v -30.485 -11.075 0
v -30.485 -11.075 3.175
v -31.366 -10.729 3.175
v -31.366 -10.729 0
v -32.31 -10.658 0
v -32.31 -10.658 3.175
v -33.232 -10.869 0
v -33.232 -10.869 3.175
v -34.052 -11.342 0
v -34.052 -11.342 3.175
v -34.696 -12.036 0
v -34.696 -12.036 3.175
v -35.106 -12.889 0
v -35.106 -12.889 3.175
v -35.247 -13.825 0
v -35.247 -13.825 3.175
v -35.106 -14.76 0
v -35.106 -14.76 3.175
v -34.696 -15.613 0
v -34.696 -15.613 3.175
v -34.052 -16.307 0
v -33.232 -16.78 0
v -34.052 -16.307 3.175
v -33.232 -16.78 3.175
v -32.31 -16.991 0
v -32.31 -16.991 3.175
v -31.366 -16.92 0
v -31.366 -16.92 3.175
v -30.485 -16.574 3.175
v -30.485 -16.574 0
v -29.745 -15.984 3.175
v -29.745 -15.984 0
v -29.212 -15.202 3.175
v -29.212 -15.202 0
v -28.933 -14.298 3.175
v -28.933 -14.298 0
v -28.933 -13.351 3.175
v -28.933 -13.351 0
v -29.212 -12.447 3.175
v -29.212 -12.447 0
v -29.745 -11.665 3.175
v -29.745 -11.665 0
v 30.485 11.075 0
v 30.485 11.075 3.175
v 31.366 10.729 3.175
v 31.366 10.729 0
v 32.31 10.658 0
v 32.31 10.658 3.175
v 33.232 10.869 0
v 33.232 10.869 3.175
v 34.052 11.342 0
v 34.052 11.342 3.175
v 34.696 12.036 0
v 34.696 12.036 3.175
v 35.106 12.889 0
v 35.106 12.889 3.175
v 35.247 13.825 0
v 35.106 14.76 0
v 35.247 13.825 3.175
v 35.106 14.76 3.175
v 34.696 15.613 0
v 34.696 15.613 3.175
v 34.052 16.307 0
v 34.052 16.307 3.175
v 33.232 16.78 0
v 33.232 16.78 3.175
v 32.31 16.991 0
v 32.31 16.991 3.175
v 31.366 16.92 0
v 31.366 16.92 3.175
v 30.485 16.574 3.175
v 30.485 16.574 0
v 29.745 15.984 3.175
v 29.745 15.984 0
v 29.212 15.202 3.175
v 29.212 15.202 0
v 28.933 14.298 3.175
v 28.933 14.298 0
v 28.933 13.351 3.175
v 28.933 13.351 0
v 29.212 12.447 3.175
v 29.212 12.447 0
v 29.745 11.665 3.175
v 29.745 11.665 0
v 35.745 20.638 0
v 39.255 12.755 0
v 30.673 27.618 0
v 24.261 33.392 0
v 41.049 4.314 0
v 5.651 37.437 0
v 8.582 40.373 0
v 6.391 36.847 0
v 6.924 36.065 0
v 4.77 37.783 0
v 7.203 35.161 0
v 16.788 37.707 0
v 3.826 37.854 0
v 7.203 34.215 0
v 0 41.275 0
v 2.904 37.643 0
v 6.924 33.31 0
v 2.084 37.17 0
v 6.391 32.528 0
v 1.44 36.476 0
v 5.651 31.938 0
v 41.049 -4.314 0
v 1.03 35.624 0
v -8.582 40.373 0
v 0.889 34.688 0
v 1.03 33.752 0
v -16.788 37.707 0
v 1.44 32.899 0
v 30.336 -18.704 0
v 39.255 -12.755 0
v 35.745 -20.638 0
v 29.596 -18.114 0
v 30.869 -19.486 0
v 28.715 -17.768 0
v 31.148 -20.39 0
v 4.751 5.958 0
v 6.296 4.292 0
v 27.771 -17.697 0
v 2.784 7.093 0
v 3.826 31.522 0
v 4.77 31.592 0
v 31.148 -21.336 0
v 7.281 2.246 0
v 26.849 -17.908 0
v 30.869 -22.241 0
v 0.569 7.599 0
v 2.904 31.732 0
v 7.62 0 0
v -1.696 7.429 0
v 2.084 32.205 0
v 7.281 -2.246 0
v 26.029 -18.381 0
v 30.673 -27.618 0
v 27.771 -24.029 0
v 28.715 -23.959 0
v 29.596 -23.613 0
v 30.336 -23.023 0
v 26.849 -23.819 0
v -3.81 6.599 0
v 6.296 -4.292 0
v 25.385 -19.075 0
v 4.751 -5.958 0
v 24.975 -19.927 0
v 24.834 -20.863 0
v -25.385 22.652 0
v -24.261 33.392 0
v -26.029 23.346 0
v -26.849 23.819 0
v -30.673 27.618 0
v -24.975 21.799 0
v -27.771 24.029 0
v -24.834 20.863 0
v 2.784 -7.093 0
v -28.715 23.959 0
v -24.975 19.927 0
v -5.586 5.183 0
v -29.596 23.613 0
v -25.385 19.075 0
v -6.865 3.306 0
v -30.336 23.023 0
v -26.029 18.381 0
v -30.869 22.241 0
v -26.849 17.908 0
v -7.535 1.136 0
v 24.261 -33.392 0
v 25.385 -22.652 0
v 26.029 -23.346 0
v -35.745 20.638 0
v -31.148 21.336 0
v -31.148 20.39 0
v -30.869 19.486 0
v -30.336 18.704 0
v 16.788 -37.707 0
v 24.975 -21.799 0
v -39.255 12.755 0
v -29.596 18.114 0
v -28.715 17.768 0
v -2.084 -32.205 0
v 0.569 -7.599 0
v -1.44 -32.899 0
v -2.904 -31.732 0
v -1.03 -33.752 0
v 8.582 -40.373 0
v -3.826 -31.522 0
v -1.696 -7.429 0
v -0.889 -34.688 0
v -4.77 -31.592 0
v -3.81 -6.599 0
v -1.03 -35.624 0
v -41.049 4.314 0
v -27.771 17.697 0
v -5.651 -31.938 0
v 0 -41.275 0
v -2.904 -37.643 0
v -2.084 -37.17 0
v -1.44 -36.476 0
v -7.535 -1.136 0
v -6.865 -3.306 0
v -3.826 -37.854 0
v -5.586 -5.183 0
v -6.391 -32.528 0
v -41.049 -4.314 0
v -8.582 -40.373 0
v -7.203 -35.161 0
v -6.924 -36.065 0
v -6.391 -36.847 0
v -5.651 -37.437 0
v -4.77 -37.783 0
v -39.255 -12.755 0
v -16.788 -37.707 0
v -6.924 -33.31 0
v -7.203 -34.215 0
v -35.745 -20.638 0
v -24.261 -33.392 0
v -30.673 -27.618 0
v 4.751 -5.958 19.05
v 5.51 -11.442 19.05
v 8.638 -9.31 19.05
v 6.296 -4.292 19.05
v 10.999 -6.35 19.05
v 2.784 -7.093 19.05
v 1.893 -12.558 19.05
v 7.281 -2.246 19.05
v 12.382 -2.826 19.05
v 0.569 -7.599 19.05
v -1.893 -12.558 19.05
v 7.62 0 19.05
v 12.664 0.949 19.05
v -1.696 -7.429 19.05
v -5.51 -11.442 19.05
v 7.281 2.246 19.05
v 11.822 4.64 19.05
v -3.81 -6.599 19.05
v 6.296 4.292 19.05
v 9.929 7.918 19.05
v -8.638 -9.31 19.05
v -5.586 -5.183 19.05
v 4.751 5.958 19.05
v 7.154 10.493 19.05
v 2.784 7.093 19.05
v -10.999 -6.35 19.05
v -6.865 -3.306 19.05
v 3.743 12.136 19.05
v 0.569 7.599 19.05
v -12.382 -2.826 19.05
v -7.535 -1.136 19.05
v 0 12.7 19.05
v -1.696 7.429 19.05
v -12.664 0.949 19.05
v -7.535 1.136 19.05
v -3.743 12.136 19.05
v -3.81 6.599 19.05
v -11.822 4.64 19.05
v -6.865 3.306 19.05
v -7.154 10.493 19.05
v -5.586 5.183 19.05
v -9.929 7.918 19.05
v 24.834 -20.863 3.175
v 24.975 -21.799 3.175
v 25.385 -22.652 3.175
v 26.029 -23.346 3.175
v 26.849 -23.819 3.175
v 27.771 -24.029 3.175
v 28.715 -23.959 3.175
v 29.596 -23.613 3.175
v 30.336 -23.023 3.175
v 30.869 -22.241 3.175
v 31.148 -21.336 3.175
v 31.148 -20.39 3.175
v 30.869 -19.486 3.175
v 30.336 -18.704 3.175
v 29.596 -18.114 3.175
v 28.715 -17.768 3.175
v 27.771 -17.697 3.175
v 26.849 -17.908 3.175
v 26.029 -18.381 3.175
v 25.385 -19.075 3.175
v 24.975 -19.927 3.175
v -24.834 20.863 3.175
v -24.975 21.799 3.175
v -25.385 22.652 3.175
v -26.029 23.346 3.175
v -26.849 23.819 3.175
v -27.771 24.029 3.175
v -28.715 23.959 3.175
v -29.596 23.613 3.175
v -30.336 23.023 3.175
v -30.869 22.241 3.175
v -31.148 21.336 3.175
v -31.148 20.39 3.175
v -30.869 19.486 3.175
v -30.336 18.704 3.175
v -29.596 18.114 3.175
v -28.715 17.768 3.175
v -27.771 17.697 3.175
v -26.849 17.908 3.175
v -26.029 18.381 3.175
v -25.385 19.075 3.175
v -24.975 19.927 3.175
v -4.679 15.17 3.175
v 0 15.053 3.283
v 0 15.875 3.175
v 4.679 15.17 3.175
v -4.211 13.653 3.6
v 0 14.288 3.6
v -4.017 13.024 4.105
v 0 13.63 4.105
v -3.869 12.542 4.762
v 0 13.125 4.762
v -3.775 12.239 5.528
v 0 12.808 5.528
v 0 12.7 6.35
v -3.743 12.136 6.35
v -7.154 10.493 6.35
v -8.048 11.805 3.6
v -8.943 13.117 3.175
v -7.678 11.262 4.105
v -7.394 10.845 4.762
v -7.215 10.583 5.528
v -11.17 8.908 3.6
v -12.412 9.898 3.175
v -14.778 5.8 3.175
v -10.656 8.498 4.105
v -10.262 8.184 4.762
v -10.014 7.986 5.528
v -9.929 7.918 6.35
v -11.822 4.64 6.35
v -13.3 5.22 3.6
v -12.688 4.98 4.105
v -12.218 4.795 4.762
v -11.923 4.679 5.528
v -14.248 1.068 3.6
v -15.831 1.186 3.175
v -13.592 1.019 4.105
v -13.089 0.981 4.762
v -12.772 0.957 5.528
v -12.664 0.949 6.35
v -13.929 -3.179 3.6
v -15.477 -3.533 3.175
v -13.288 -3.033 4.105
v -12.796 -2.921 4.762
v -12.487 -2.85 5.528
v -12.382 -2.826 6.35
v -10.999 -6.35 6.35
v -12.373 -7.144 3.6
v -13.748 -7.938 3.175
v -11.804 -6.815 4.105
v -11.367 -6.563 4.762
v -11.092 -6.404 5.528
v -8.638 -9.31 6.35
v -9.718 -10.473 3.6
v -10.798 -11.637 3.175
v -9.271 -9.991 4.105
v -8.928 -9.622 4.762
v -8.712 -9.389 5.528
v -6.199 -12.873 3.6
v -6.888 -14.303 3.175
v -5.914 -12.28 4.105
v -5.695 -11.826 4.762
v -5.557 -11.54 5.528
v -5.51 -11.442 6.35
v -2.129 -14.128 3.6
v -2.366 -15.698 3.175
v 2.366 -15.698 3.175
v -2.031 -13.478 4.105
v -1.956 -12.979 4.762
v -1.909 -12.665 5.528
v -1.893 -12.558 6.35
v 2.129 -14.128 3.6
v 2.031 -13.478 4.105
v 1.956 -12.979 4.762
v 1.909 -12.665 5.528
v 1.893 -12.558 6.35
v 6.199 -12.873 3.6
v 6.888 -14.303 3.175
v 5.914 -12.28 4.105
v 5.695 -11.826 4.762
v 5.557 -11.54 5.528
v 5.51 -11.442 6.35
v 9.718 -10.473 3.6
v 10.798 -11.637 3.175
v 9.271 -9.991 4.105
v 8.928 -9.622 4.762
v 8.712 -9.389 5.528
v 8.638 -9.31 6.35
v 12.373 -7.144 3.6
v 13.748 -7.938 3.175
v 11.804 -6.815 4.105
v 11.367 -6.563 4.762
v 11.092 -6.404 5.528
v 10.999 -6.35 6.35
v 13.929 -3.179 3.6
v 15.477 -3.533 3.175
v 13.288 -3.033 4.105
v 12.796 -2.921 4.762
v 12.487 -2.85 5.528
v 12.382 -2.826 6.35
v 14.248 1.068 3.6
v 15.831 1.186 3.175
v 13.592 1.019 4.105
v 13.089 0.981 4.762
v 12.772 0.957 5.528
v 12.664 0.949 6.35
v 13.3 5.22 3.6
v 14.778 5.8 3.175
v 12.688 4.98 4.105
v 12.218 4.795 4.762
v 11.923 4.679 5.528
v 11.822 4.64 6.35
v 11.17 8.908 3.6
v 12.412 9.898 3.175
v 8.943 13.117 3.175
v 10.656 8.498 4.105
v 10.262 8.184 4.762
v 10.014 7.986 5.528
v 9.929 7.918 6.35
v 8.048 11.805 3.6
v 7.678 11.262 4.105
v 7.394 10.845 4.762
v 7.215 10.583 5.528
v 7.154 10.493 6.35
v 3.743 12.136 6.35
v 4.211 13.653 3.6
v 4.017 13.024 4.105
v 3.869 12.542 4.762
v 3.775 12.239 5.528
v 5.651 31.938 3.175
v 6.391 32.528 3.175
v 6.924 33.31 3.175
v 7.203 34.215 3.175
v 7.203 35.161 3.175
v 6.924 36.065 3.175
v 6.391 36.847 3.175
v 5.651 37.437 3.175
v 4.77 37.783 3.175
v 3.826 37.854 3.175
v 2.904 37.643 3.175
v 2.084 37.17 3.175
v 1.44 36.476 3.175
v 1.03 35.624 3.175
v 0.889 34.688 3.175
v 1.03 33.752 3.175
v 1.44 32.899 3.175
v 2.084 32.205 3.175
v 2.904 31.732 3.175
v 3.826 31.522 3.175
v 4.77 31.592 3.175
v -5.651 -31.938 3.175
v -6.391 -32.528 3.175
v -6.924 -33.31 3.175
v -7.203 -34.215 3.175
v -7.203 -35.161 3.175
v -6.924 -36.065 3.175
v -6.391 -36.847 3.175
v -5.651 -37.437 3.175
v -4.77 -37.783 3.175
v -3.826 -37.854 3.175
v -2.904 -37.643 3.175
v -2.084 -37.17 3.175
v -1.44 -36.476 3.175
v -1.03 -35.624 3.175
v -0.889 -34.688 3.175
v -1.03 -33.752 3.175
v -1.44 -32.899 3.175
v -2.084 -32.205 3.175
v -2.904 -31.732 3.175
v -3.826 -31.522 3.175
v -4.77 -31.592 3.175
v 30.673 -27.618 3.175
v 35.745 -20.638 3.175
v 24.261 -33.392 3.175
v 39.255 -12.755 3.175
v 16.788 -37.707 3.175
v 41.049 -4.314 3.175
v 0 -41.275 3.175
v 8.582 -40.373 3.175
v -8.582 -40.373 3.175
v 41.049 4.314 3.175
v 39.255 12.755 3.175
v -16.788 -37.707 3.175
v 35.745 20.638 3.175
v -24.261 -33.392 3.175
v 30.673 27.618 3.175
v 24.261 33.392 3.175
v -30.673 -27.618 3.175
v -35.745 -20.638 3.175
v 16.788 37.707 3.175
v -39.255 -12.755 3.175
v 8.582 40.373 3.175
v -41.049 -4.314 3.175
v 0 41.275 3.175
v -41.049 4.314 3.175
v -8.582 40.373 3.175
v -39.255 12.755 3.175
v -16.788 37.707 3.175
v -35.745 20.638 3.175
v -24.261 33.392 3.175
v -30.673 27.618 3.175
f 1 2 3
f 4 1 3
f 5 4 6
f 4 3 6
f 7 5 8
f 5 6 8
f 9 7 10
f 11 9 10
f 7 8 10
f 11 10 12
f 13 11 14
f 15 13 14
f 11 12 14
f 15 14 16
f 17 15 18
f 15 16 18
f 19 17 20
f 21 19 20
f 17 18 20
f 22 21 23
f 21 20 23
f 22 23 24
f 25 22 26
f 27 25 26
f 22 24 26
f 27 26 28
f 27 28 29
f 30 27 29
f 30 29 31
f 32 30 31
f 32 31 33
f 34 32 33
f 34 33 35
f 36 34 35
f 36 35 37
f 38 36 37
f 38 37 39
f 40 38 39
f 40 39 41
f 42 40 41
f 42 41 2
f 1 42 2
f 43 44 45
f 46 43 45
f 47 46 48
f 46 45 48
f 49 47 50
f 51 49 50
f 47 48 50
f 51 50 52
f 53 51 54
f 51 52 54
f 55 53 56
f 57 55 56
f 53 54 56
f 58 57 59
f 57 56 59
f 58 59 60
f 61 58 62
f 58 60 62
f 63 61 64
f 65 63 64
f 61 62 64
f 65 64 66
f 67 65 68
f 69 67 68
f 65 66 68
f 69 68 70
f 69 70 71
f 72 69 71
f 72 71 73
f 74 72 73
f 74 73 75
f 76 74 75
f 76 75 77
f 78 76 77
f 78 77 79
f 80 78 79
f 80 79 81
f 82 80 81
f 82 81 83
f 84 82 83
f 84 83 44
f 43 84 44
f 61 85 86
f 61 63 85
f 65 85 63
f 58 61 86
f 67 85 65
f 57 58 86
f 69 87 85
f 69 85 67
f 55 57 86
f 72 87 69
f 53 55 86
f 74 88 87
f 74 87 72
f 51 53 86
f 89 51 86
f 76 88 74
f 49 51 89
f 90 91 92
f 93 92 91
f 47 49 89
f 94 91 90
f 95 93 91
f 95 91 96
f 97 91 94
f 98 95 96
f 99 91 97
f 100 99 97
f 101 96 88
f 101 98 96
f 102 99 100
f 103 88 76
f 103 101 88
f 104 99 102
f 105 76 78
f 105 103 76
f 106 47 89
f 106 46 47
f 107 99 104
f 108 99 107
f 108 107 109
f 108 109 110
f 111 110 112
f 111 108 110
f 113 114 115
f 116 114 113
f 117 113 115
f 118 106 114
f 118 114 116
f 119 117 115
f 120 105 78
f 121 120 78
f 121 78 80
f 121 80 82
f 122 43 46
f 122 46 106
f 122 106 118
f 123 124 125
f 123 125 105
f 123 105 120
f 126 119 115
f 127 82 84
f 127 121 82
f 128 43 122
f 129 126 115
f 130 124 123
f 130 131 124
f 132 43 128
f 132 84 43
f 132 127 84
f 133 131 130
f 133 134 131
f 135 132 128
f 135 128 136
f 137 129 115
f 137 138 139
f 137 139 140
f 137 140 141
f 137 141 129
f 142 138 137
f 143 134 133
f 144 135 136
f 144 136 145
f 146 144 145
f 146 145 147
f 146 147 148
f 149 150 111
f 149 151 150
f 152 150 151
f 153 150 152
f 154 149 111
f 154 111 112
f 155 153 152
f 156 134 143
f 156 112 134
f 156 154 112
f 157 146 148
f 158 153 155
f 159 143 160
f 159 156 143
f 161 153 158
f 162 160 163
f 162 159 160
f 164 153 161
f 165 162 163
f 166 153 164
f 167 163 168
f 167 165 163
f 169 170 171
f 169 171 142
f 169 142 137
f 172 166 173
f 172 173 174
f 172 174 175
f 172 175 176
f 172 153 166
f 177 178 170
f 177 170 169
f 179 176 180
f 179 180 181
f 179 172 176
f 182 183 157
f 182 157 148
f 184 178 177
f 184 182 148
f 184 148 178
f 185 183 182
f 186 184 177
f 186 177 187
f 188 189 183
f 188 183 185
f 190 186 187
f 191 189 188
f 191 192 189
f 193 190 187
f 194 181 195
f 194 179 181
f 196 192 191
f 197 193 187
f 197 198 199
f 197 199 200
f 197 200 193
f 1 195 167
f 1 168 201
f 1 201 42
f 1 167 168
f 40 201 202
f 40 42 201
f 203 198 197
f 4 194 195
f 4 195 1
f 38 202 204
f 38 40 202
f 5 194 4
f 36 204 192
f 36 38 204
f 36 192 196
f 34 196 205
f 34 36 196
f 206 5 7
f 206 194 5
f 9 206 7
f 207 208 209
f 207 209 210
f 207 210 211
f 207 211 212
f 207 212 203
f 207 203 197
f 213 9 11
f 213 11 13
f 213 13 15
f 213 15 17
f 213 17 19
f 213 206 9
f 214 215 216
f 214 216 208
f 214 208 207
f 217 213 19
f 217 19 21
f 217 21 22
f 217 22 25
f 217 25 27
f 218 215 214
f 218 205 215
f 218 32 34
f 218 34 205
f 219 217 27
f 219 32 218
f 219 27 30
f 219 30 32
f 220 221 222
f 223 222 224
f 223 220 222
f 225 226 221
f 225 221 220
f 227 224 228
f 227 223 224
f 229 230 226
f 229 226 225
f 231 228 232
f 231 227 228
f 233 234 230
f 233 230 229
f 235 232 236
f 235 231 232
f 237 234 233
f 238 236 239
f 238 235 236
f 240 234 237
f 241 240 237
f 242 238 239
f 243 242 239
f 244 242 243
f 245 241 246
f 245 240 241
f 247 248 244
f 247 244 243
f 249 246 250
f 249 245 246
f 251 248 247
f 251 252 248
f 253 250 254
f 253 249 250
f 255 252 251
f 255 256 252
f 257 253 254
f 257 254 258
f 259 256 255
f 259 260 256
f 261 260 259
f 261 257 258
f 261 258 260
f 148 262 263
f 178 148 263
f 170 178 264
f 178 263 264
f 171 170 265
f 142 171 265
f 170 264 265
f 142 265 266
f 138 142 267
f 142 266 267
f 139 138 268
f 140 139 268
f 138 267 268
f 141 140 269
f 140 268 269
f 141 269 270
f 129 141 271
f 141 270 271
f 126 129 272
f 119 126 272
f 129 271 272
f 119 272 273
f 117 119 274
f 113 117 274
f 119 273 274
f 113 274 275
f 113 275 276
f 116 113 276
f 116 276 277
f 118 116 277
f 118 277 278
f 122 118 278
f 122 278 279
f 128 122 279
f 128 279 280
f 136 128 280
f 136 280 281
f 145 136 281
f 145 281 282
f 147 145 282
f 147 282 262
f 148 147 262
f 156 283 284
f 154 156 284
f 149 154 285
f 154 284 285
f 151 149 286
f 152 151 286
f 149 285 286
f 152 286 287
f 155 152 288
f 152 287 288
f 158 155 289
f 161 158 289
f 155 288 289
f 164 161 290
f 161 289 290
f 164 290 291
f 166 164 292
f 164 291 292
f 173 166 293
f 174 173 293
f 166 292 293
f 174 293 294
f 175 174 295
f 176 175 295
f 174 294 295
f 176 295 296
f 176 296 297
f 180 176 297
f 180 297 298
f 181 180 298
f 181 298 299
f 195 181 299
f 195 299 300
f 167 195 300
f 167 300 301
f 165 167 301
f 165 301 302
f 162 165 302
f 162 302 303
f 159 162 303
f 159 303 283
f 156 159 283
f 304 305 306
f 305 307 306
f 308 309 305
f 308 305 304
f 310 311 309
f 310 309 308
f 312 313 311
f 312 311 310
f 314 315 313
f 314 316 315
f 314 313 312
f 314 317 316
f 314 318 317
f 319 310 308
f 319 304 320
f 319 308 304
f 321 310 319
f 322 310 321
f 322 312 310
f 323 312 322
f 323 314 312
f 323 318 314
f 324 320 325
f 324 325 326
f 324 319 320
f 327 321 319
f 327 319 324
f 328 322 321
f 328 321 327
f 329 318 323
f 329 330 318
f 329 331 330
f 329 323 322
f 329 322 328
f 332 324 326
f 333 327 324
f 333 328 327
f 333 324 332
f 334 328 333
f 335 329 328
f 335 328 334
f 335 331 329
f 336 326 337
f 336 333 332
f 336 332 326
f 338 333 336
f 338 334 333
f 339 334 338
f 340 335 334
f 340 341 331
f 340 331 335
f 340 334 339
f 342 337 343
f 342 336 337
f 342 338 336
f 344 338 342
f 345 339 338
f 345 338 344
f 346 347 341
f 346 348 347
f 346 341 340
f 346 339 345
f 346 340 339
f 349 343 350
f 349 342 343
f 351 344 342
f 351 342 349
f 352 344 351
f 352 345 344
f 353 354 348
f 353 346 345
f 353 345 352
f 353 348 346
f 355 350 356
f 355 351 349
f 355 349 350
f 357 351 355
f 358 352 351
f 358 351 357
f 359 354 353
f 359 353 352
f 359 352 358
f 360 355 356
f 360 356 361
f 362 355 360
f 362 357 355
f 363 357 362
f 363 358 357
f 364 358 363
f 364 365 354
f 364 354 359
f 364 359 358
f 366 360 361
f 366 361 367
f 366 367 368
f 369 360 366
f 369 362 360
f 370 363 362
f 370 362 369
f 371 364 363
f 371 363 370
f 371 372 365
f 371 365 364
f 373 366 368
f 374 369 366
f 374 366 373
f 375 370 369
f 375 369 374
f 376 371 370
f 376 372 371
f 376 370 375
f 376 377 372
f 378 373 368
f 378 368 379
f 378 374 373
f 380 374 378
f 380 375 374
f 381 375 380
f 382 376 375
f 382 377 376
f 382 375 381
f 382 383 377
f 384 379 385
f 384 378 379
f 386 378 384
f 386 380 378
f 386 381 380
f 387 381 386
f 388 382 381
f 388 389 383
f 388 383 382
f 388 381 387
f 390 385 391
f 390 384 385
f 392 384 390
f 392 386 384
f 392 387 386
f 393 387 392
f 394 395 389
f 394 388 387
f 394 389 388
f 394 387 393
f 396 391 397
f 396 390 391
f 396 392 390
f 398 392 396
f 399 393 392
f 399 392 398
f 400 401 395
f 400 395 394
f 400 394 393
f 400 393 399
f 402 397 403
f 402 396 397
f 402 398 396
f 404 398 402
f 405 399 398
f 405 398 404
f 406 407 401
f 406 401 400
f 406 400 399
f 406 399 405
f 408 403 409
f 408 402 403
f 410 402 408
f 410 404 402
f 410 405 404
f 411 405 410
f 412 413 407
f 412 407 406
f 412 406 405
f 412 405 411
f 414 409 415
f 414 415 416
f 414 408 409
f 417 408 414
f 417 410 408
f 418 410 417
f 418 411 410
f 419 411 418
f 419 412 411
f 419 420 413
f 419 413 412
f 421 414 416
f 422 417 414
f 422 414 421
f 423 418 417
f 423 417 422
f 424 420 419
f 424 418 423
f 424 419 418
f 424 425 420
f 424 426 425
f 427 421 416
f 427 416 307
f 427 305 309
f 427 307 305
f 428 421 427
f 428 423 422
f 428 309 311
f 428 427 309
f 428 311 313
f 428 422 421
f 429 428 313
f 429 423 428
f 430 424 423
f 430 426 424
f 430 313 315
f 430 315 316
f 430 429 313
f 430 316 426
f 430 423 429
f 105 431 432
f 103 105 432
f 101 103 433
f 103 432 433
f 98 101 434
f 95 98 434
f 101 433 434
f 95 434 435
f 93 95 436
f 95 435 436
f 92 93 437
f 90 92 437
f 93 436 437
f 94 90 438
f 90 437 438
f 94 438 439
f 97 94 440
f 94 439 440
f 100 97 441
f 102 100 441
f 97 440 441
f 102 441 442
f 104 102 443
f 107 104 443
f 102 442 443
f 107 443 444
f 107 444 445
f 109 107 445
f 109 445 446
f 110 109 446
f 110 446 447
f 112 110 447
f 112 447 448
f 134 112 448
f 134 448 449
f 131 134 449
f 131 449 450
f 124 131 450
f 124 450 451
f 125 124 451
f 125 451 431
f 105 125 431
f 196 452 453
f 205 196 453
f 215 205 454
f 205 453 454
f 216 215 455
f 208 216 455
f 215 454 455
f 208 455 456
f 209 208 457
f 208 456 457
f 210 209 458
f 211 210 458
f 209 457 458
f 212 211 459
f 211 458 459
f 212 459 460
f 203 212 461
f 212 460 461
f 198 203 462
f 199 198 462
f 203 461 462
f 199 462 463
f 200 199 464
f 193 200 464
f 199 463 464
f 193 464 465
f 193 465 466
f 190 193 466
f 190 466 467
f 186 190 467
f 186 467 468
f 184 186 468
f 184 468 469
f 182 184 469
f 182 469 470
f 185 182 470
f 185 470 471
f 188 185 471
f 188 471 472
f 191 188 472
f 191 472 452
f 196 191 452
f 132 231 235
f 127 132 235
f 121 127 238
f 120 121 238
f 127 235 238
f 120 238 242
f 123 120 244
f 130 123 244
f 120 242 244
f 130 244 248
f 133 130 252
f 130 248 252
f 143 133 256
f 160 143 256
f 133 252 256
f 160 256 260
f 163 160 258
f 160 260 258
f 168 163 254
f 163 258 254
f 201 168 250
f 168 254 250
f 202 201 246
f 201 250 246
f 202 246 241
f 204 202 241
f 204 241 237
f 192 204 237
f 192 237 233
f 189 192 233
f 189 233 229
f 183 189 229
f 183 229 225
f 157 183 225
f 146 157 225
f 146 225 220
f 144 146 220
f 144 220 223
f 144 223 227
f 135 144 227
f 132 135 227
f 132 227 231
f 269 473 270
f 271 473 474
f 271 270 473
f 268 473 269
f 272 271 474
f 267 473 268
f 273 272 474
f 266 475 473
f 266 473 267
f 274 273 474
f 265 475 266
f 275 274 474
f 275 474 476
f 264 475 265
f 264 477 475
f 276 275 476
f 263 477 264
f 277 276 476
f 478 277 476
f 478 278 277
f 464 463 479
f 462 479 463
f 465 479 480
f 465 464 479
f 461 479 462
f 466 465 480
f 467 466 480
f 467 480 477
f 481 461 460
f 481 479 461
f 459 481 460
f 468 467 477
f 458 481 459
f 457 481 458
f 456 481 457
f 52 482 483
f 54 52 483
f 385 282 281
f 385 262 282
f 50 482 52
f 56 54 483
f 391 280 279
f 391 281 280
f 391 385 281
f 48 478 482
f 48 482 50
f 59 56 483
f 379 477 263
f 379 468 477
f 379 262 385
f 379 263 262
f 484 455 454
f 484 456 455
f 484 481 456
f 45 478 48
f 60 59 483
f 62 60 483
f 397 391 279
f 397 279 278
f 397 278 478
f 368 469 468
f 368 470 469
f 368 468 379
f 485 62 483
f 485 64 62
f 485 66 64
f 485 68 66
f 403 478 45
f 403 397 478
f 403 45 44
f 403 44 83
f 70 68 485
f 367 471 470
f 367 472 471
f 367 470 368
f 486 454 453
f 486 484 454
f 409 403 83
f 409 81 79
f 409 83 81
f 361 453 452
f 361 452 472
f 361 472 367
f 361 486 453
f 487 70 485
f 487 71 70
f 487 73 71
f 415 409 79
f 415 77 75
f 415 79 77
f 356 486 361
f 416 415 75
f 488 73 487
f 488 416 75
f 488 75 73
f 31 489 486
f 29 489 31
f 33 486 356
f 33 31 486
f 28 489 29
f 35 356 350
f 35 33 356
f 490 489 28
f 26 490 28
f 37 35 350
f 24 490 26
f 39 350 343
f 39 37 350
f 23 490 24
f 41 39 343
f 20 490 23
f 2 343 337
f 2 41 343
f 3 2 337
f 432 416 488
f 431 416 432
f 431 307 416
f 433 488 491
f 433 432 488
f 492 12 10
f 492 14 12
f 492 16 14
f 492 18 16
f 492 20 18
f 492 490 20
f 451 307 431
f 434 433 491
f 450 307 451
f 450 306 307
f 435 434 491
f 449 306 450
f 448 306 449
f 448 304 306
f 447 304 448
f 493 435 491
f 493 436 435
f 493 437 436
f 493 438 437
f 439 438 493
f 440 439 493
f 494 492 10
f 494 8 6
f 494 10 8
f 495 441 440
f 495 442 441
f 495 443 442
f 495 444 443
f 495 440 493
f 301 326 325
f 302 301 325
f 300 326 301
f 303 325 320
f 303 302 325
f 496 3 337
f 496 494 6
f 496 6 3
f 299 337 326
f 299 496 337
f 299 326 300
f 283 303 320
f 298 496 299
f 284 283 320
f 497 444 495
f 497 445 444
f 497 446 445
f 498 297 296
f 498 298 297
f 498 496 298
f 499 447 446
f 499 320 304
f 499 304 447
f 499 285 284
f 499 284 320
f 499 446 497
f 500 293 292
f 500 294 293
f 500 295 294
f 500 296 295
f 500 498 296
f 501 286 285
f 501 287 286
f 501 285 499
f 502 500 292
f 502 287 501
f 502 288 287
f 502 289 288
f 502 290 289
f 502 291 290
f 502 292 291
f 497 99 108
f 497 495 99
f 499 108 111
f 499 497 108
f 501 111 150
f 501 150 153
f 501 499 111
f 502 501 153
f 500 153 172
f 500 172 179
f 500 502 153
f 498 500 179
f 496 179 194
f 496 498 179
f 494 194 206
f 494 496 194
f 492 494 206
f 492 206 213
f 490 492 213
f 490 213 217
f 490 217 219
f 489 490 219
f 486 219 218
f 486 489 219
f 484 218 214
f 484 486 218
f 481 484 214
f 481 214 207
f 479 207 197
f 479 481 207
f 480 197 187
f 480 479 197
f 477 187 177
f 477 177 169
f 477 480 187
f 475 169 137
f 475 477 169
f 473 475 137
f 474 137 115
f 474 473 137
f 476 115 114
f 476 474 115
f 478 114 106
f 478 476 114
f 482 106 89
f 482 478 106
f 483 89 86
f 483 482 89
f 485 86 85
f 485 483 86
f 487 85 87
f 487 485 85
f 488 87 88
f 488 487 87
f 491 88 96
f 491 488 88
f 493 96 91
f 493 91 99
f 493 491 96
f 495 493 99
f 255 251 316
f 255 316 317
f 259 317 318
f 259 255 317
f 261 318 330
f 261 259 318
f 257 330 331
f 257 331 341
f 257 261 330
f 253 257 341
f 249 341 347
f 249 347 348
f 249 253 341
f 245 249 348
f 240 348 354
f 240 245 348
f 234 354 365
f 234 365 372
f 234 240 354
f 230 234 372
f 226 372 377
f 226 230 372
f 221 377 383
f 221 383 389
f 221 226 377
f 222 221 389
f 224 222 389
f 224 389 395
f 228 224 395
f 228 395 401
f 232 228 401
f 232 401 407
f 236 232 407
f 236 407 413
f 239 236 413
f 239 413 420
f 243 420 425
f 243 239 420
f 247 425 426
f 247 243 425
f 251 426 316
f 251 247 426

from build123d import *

# Parameters (mm, degrees)
SKETCH3_R          = 7.62
SKETCH3_R_2        = 3.175
CUT_EXTRUDE1_DEPTH = 62.401577748
CIRPATTERN1_COUNT  = 6
FILLET1_R          = 3.175


with BuildPart() as part:
    # Sketch2 → Revolve1 (revolve)
    with BuildSketch(Plane(origin=(0, 0, 0), x_dir=(0, 0, -1), z_dir=(1, 0, 0))):
        Polygon((0, 0), (0, 41.275), (-3.175, 41.275), (-3.175, 12.7), (-19.05, 12.7), (-19.05, 0), align=None)
    revolve(axis=Axis((0, 0, 0), (0, 0, 1)))

    # Sketch3 → Cut-Extrude1 (cut, through all)
    with BuildSketch(Plane.XY.offset(19.05)):
        Circle(SKETCH3_R)
        with Locations((-28.008609796, 20.863206903)):
            Circle(SKETCH3_R_2)
    cut_extrude1 = extrude(amount=-CUT_EXTRUDE1_DEPTH, mode=Mode.SUBTRACT)

    # CirPattern1: Cut-Extrude1 ×6 about axis
    cirpattern1_axis = Axis((0, 0, 0), (0, 0, 1))
    for i in range(1, CIRPATTERN1_COUNT):
        add(cut_extrude1.rotate(cirpattern1_axis, i * 360 / CIRPATTERN1_COUNT), mode=Mode.SUBTRACT)

    # Fillet1
    fillet1_edges = [part.edges().sort_by_distance(p)[0] for p in [
        (0, -12.7, 3.175),
    ]]
    fillet(fillet1_edges, radius=FILLET1_R)


solid = part.part
